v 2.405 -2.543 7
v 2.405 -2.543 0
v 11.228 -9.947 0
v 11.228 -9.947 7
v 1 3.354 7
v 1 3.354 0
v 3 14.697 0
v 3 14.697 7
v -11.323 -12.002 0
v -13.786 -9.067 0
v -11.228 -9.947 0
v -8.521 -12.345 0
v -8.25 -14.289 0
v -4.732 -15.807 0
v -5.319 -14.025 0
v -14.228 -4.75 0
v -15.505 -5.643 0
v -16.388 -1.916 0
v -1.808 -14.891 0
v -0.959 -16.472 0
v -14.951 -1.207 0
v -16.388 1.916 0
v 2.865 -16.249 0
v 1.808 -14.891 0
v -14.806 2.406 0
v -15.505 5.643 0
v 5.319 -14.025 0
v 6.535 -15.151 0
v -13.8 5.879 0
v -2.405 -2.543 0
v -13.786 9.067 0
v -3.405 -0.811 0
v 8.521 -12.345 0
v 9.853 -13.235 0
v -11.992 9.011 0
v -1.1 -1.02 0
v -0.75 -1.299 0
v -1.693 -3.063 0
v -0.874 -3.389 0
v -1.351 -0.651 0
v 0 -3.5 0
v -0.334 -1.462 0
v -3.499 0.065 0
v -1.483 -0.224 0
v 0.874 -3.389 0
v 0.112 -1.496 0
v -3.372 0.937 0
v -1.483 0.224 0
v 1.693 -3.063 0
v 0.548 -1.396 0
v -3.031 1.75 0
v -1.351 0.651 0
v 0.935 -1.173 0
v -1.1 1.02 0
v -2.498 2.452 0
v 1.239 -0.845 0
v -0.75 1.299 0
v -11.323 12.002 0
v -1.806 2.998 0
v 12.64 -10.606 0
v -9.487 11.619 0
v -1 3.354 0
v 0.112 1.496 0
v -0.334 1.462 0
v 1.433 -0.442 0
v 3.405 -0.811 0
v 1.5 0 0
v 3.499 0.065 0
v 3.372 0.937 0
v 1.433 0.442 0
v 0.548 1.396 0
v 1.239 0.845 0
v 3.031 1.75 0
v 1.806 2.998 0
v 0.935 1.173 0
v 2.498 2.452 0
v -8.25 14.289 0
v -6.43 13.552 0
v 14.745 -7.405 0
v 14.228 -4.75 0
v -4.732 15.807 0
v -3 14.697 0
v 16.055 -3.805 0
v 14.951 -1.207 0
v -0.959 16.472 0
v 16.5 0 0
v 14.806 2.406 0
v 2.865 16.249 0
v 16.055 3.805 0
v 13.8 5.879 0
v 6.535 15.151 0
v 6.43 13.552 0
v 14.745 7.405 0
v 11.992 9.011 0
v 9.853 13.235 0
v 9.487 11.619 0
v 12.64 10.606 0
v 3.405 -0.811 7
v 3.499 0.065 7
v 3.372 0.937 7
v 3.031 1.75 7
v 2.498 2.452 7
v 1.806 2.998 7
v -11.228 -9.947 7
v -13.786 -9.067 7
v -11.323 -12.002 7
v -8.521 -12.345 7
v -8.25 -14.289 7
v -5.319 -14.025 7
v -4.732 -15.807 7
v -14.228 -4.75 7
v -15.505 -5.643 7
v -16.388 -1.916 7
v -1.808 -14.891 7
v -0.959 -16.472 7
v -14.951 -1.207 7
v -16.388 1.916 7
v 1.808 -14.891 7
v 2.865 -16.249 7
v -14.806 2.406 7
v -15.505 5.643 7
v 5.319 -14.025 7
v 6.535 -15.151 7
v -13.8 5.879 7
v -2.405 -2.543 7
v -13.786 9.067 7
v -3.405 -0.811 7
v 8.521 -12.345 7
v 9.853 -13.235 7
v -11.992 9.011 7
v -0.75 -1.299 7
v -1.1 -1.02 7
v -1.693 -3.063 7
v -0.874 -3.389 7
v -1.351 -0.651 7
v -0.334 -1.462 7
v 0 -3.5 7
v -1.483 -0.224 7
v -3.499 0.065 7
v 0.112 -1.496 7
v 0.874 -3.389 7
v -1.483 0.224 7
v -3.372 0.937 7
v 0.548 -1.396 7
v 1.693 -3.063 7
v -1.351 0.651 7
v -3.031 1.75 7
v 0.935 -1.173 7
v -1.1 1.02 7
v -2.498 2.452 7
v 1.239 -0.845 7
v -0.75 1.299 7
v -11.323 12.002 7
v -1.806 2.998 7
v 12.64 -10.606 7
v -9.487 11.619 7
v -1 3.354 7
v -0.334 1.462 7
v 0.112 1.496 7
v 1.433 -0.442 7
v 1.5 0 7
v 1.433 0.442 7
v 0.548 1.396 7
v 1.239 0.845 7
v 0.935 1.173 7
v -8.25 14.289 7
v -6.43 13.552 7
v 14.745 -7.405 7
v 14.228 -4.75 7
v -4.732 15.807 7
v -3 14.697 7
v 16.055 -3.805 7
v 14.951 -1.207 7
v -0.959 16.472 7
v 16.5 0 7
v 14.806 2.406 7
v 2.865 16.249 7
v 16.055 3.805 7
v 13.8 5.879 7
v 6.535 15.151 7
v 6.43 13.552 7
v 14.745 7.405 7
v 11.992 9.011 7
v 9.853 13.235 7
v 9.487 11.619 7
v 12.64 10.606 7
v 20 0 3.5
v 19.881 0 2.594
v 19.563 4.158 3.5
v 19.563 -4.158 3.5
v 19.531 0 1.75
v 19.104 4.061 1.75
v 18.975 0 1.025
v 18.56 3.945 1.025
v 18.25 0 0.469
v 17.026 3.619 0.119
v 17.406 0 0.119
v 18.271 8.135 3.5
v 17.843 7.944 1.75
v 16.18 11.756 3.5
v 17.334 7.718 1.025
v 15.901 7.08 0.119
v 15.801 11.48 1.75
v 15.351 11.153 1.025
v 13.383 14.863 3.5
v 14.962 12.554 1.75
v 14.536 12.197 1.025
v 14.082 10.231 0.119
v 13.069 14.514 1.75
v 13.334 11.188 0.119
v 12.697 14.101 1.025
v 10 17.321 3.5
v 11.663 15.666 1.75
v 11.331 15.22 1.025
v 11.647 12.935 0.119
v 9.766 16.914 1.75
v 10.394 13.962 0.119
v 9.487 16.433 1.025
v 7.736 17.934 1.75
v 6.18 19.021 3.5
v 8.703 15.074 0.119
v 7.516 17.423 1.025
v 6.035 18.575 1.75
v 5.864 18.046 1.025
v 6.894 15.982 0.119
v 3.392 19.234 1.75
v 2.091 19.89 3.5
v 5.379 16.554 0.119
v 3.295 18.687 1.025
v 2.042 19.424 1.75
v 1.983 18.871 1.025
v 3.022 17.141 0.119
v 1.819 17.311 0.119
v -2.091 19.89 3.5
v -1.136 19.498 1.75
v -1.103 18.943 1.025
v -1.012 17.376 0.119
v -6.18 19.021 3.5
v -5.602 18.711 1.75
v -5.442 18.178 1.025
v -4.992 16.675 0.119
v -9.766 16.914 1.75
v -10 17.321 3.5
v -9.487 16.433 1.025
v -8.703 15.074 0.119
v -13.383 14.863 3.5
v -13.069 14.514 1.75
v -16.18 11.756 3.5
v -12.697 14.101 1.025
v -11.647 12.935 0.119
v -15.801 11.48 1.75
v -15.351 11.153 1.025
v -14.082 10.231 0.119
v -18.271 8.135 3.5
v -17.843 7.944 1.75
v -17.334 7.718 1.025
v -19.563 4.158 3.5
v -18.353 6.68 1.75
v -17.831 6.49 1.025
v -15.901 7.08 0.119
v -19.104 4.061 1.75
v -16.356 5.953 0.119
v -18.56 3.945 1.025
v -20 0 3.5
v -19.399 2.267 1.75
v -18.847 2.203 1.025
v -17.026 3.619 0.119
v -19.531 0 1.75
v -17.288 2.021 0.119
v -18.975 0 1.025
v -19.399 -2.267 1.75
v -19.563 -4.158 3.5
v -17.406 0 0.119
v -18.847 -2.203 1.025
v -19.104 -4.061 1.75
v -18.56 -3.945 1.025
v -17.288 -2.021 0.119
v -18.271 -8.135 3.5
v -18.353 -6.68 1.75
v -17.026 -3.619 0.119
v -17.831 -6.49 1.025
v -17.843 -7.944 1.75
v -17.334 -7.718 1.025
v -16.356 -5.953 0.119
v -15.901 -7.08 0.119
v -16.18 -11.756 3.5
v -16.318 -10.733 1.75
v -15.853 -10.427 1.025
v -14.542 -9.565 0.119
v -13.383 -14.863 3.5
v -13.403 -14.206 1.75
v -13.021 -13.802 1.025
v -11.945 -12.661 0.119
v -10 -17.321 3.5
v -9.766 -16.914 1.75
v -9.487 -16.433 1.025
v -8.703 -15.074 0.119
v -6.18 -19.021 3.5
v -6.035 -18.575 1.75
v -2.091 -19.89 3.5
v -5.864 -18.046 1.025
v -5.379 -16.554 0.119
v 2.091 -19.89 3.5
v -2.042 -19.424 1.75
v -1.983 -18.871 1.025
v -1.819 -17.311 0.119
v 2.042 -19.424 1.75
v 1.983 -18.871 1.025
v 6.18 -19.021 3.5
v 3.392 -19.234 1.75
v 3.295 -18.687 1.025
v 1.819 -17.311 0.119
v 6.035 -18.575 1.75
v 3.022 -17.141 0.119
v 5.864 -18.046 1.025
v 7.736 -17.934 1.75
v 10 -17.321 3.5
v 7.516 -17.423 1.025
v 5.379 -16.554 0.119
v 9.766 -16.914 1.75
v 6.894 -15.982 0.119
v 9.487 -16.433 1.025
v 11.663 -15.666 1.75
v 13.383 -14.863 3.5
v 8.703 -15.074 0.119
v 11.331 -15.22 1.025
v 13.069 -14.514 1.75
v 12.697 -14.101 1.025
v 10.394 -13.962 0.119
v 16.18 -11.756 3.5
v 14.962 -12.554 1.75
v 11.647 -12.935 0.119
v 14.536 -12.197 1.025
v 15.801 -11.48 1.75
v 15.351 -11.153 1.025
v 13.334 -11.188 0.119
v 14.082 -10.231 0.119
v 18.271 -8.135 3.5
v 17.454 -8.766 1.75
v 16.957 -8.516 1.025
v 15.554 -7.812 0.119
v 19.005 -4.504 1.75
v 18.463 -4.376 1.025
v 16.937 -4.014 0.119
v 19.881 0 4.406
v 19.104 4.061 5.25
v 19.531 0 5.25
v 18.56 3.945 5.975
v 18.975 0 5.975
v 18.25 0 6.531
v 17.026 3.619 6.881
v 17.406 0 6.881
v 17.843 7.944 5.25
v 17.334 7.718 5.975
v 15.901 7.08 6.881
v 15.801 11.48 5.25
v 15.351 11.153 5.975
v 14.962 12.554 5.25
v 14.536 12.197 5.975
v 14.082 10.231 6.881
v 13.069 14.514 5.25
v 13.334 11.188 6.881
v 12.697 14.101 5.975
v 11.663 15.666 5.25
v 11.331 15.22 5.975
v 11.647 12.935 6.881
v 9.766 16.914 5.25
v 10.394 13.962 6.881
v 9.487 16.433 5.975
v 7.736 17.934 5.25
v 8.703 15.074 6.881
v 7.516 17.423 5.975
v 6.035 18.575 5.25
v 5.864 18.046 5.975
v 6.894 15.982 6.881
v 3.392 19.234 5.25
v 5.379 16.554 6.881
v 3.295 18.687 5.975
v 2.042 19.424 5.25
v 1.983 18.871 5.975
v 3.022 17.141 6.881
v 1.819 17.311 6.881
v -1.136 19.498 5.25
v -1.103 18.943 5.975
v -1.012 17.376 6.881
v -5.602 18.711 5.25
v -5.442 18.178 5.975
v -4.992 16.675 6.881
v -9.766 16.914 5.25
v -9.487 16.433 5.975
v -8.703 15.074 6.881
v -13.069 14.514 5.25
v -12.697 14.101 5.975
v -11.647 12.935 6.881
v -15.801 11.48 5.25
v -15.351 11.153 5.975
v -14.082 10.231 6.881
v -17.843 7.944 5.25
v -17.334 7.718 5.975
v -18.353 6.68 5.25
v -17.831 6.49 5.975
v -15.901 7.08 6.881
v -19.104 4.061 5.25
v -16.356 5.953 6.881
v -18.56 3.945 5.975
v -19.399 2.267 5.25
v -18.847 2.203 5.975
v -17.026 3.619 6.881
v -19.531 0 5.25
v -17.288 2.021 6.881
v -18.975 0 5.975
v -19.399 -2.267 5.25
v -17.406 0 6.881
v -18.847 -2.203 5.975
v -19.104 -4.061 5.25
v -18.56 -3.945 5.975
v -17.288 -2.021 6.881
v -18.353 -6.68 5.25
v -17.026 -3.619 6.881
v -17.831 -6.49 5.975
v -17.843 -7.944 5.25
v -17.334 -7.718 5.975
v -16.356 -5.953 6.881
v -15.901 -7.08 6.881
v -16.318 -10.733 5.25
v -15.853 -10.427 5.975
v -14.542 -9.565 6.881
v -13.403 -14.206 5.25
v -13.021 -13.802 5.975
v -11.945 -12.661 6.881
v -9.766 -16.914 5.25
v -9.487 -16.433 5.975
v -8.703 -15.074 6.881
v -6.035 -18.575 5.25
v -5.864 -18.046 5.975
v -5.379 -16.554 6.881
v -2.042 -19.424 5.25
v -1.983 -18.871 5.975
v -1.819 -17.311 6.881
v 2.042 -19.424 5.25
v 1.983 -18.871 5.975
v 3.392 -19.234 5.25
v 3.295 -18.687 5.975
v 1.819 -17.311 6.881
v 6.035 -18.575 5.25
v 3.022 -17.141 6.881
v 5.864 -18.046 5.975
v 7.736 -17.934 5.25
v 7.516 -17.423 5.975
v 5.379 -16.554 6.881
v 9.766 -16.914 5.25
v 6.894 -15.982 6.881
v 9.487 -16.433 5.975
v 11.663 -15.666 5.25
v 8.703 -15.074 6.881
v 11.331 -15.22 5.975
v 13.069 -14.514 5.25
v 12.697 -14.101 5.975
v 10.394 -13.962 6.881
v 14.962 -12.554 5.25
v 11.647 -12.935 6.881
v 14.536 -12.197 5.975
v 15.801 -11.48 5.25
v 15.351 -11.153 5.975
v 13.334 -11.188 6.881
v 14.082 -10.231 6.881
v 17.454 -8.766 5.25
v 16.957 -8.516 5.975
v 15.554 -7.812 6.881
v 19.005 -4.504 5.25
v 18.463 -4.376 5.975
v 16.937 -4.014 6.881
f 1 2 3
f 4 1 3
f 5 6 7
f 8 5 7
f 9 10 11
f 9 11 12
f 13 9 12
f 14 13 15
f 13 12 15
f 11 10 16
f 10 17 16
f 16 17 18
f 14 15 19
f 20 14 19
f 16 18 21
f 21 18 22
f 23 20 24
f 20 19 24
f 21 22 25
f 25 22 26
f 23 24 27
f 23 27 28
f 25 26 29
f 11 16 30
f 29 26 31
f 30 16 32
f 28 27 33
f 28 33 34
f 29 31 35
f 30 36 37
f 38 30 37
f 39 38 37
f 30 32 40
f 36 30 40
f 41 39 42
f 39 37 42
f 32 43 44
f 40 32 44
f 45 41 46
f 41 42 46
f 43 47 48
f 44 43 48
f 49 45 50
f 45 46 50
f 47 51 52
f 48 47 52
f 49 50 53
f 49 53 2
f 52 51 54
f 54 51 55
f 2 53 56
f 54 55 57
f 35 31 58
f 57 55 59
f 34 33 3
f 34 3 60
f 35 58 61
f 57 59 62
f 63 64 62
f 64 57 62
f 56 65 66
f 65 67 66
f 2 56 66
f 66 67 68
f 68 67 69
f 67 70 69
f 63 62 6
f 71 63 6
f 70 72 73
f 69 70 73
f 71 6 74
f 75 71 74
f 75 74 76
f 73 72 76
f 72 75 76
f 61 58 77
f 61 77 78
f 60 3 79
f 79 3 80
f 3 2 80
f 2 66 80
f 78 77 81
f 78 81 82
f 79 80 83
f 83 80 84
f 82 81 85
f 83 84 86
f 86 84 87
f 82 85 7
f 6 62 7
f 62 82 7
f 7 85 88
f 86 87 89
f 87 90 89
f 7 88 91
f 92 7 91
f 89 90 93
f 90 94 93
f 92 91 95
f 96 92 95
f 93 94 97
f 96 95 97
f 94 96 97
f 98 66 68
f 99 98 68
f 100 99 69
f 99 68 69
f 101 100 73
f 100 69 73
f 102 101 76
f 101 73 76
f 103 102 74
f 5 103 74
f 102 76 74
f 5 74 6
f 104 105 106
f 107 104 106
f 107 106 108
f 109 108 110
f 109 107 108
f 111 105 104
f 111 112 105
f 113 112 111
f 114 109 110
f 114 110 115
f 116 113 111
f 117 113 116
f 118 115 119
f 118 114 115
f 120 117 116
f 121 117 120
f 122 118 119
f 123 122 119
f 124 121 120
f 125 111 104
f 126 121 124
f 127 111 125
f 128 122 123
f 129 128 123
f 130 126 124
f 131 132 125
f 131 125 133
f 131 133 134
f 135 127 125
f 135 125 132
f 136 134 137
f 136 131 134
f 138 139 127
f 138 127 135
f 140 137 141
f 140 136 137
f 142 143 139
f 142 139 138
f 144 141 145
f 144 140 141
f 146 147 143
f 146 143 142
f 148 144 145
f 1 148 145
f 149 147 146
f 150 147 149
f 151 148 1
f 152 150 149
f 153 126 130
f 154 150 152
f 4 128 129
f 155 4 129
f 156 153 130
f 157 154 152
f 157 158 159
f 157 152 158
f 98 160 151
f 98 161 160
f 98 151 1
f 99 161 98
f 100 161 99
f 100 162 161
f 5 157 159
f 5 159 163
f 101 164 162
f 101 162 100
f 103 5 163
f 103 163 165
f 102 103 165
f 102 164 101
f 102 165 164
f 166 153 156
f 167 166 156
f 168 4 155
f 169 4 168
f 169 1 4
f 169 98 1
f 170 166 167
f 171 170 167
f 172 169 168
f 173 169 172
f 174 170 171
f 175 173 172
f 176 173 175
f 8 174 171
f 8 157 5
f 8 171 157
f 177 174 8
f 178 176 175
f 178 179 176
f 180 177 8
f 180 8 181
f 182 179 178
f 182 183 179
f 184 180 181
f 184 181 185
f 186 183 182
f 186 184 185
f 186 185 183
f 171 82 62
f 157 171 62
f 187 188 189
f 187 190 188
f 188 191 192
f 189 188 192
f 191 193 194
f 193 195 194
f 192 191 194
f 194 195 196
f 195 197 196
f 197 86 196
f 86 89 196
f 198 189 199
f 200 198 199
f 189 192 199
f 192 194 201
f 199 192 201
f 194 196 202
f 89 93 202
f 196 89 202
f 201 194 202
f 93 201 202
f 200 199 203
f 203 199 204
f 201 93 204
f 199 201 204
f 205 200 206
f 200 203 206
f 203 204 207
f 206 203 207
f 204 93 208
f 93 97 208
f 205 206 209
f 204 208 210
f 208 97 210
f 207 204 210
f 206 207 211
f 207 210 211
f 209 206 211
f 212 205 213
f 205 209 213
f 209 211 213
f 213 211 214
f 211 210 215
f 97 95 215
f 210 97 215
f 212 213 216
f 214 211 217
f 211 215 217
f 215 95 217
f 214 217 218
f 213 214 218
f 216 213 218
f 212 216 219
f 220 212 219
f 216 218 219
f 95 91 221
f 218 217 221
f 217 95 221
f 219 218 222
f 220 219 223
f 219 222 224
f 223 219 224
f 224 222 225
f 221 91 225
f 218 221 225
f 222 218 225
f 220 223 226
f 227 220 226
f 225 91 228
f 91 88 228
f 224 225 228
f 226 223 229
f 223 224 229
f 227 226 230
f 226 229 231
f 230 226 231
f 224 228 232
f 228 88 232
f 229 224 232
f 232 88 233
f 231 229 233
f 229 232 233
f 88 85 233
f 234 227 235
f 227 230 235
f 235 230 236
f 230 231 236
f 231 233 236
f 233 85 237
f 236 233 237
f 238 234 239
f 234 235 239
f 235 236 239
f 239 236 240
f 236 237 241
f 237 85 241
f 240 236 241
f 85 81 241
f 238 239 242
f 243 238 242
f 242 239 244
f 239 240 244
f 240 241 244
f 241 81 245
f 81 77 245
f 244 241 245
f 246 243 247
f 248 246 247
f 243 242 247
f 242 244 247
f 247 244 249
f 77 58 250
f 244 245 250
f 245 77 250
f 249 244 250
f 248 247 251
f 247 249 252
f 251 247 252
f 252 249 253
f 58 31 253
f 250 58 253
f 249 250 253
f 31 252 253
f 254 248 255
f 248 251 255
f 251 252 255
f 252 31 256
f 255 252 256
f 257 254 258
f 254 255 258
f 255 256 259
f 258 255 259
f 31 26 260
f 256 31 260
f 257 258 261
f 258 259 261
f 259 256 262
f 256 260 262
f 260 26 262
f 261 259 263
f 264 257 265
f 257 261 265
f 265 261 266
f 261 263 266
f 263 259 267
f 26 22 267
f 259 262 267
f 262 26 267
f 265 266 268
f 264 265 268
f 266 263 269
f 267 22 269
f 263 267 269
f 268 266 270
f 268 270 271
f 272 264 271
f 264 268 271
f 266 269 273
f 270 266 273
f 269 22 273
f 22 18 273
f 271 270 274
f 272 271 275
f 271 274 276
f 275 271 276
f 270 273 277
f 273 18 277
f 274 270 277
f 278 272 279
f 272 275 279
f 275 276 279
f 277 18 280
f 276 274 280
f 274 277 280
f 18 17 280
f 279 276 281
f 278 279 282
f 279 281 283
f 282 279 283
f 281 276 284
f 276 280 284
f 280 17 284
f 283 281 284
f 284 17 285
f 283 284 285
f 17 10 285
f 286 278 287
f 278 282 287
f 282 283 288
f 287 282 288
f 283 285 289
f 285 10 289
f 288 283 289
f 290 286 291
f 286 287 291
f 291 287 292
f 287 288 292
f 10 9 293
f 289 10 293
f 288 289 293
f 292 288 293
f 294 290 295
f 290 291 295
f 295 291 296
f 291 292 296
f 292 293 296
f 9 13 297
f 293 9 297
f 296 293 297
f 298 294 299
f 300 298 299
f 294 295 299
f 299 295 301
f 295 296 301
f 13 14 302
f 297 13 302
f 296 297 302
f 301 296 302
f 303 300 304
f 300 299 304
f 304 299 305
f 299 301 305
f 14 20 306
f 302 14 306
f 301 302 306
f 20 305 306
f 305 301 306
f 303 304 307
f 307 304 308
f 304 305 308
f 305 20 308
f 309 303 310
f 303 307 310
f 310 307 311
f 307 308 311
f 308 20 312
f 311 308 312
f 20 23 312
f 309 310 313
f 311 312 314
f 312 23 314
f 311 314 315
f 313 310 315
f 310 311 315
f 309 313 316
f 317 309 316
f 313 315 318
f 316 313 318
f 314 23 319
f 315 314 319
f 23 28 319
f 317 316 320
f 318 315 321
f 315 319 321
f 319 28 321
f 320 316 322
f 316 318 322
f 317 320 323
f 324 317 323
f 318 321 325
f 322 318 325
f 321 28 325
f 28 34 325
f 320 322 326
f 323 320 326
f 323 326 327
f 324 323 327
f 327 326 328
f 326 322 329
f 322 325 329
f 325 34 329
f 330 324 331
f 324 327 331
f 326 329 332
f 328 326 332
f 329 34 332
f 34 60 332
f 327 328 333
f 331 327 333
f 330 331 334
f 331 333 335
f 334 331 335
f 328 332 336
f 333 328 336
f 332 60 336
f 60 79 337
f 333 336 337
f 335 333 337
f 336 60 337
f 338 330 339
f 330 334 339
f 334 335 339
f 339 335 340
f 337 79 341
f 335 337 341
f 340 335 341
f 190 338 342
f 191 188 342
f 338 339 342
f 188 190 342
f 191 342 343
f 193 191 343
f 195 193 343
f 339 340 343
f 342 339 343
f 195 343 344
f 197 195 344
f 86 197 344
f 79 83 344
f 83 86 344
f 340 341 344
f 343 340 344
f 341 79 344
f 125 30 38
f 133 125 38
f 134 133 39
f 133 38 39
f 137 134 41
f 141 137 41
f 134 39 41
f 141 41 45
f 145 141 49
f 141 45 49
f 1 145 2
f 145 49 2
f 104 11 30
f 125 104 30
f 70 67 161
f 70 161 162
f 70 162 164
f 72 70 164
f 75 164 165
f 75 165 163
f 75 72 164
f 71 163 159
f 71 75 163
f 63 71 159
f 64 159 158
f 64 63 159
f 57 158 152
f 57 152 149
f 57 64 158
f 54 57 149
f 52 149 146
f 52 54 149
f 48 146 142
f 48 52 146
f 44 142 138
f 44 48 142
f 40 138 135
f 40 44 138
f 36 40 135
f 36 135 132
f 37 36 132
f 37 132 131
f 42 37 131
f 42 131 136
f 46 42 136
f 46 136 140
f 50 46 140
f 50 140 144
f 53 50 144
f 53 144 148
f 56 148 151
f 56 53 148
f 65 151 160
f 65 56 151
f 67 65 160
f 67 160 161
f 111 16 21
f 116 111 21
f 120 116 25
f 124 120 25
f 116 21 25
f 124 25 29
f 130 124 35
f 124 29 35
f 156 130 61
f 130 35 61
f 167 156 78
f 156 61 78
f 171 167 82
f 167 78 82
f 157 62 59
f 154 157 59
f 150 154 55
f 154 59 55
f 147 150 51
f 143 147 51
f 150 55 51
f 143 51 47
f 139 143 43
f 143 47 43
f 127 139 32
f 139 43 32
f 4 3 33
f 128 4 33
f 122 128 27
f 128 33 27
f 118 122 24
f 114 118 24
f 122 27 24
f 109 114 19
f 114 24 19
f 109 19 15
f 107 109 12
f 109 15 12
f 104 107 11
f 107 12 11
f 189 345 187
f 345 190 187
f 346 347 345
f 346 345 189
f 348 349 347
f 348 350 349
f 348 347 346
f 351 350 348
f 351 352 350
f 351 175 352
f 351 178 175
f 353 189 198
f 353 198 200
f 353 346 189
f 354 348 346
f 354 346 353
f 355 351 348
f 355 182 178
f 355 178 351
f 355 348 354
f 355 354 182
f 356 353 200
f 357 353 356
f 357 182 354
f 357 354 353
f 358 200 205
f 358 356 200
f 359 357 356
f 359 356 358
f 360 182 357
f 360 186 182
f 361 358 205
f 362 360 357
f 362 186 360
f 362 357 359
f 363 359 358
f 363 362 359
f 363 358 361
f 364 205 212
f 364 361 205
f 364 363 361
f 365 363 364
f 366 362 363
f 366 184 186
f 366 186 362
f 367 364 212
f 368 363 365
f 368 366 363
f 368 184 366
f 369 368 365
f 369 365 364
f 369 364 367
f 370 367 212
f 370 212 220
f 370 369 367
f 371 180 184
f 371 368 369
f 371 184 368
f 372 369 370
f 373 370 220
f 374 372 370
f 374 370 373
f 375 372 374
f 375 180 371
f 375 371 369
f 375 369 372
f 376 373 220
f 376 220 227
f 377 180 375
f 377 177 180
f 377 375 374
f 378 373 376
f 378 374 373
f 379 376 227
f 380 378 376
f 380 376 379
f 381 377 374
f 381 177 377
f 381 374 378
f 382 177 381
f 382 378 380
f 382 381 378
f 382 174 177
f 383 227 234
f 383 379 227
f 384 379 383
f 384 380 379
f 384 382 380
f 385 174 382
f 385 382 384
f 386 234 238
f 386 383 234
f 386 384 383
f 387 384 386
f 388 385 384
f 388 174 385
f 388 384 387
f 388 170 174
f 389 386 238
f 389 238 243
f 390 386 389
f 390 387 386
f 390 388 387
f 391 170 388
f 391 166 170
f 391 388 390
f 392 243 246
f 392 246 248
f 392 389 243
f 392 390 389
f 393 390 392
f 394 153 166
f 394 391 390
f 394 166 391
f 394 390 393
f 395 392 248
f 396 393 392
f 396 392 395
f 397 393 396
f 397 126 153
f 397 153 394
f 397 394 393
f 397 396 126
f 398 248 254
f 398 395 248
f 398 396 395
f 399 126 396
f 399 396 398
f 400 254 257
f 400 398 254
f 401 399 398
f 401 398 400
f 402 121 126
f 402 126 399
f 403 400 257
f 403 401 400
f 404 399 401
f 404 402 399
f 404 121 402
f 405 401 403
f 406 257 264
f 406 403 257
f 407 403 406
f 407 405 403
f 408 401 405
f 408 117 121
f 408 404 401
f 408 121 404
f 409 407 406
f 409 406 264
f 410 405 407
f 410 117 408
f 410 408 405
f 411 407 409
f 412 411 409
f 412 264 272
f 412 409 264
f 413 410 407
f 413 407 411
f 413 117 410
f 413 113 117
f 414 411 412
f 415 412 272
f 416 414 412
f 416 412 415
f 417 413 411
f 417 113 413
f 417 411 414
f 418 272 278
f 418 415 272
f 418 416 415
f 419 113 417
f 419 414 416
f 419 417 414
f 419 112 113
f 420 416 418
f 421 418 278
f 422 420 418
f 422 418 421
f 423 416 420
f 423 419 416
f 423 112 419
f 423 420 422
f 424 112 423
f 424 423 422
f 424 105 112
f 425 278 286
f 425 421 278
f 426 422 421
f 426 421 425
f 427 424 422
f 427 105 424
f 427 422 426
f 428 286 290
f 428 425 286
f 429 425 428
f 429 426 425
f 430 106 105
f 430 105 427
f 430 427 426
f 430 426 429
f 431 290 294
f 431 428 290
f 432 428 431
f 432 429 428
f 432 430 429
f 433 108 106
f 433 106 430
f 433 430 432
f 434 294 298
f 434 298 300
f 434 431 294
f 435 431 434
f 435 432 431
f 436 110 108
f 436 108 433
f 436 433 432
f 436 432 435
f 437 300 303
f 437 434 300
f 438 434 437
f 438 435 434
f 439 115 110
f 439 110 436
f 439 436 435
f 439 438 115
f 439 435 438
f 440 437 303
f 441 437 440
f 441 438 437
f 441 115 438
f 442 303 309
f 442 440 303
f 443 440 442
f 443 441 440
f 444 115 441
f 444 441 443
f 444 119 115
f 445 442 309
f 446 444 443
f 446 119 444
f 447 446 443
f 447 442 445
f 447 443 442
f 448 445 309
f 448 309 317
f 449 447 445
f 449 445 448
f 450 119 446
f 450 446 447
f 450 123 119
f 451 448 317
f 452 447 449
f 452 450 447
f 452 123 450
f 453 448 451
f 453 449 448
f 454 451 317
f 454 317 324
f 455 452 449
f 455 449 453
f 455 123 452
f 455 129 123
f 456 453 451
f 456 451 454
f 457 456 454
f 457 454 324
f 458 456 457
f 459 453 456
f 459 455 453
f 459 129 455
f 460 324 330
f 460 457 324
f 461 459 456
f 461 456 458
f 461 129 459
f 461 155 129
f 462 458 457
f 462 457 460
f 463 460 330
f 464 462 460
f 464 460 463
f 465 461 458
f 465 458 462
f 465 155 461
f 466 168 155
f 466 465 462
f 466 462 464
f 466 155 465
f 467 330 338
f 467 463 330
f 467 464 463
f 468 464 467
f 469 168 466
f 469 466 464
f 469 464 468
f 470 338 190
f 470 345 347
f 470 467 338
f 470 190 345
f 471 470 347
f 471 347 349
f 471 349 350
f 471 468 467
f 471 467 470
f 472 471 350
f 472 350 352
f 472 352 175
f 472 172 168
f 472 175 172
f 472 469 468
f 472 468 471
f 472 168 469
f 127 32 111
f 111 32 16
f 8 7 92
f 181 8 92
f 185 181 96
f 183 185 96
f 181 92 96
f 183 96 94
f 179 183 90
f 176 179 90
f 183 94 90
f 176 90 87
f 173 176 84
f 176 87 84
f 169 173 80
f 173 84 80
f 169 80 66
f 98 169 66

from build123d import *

# Parameters (mm, degrees)
F0_R     = 20
F0_R_2   = 1.5
F1_DEPTH = 7
F2_R     = 3.49999


# Not quite as in the source:
# - a fillet or chamfer is up to 0.001 mm smaller than in the source, because OpenCascade refuses the exact size


with BuildPart() as f1:
    # F0 (on Top) → F1 (new body)
    with BuildSketch(Plane.XY):
        Circle(F0_R)
        with BuildLine():
            Line((-11.2279220614, -9.9465454397), (-2.4047375097, -2.5430763869))
            ThreePointArc((-2.4047375097, -2.5430763869), (0, -3.5), (2.4047375097, -2.5430763869))
            Line((2.4047375097, -2.5430763869), (11.2279220614, -9.9465454397))
            ThreePointArc((11.2279220614, -9.9465454397), (0, -15), (-11.2279220614, -9.9465454397))
        make_face(mode=Mode.SUBTRACT)
        with BuildLine():
            ThreePointArc((-14.2279220614, -4.750393017), (-12.9903810568, 7.5), (-3, 14.6969384567))
            Line((-3, 14.6969384567), (-1, 3.3541019662))
            ThreePointArc((-1, 3.3541019662), (-3.0310889132, 1.75), (-3.4047375097, -0.8110255793))
            Line((-3.4047375097, -0.8110255793), (-14.2279220614, -4.750393017))
        make_face(mode=Mode.SUBTRACT)
        Circle(F0_R_2, mode=Mode.SUBTRACT)
        with BuildLine():
            ThreePointArc((3.4047375097, -0.8110255793), (3.0310889132, 1.75), (1, 3.3541019662))
            Line((1, 3.3541019662), (3, 14.6969384567))
            ThreePointArc((3, 14.6969384567), (12.9903810568, 7.5), (14.2279220614, -4.750393017))
            Line((14.2279220614, -4.750393017), (3.4047375097, -0.8110255793))
        make_face(mode=Mode.SUBTRACT)
    extrude(amount=F1_DEPTH)

    # F2 (radius 3.5 in the source; OpenCascade refuses exactly that, so slightly less here)
    f2_edges = [f1.edges().sort_by_distance(p)[0] for p in [
        (-20, 0, 7),
        (-20, 0, 0),
    ]]
    fillet(f2_edges, radius=F2_R)


solid = f1.part
